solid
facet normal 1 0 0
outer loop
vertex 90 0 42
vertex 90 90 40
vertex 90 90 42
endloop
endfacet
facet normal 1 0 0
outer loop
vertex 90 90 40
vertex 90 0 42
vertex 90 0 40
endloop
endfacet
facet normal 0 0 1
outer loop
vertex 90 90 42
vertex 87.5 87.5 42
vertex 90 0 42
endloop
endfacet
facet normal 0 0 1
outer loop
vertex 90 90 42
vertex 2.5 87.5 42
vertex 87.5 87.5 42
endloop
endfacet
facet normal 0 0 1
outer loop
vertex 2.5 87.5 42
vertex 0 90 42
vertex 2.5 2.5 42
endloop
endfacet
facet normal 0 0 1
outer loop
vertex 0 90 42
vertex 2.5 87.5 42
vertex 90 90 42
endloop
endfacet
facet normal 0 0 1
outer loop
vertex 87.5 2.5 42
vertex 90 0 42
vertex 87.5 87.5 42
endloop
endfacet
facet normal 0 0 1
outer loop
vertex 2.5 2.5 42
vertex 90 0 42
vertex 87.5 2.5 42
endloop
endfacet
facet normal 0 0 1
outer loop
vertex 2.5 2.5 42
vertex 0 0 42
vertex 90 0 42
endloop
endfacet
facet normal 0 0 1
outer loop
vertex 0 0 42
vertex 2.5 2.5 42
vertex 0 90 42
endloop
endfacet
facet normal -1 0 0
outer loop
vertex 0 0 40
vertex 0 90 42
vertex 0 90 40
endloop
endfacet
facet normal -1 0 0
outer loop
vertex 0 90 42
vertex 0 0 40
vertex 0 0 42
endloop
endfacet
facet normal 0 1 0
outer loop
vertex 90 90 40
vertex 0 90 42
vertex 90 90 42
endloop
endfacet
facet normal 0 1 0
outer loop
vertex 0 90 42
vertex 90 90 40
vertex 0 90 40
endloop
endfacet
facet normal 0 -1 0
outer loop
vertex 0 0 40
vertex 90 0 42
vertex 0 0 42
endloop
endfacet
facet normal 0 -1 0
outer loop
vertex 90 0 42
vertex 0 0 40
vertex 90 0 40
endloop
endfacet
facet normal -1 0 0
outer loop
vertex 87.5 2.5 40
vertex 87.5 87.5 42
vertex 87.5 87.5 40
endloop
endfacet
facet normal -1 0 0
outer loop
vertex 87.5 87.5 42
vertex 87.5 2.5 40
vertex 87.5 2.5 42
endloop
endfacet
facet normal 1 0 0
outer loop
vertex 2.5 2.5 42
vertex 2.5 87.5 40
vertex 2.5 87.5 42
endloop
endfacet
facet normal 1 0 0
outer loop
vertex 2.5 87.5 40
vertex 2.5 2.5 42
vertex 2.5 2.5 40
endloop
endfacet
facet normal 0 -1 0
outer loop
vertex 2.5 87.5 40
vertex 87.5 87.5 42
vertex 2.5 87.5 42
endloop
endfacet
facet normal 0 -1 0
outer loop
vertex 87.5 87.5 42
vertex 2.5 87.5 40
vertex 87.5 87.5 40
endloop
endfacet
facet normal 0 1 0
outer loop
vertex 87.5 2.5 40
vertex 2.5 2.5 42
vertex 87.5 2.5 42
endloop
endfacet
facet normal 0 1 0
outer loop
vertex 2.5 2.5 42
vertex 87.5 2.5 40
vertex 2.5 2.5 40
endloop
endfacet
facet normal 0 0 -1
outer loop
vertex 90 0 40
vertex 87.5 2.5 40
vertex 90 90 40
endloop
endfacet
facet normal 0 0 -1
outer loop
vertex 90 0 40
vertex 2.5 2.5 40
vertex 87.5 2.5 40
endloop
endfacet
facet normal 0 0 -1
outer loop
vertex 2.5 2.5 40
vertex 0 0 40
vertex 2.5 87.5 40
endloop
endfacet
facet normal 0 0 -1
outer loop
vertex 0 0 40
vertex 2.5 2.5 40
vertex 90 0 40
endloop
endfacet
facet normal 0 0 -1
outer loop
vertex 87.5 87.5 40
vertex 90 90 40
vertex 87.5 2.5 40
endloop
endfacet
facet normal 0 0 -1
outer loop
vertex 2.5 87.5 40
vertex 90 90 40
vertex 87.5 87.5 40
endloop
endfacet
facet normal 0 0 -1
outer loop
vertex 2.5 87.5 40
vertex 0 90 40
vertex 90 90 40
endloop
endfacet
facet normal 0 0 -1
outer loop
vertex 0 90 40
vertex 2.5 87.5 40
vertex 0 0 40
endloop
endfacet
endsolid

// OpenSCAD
// DIY Magnetic Stirrer Housing for 80mm PC Fan
// Print Orientation: Upside down (Top plate on bed, walls rising up)
// Units: mm

// --- Dimensions ---
// Outer size of the box
W = 90;
H = 90;

// Thickness of the top plate (resting on bed)
T_top = 2;

// Height of the walls (total height from bed to open top)
H_wall_total = 40;

// Wall thickness
T_wall = 2.5;

// Fan mounting hole pattern
// Pattern is 71.5mm square, centred on the plate
PATTERN_SIZE = 71.5;
HOLE_SIZE = 4.5; // M4 screw hole

// Cable notch dimensions
NOTCH_WIDTH = 12;
NOTCH_DEPTH = 8; // Reaches 8 mm down from the open edge (z=40)
// So notch is from z = 32 to z = 40.

// --- Configuration ---
// Fan is 80mm. Outer box is 90mm.
// Wall thickness is 2.5mm.
// Inner width = 90 - 2*2.5 = 85mm.
// Fan (80mm) fits inside 85mm inner space with 2.5mm clearance on each side.

$fn = 128; // High resolution for smooth curves and accurate hole sizes

// --- Main Assembly ---
// We build the part as a single solid by subtracting the inner cavity from the outer block.
// This ensures the base and walls are one continuous piece.

difference() {
    // 1. The Outer Block (Base + Walls)
    // Dimensions: W x H x (T_top + H_wall_total)
    // Position: Centered at (0,0) in X and Y to match the "centre it on the origin" rule.
    translate([0, 0, 0]) {
        cube([W, H, T_top + H_wall_total]);
    }

    // 2. The Inner Cavity (The empty space inside the box)
    // Dimensions: (W - 2*T_wall) x (H - 2*T_wall) x H_wall_total
    // Position: Starts at Z = T_top.
    // X/Y offset: T_wall from the edges.
    translate([T_wall, T_wall, T_top]) {
        cube([W - 2*T_wall, H - 2*T_wall, H_wall_total]);
    }

    // 3. Screw Holes
    // Pattern: 71.5mm square, centred on the plate.
    // The plate is 90x90, centred at (0,0).
    // Hole centers: (0,0) +/- (71.5/2 - 4.5/2)
    // Offset = 35.75 - 2.25 = 33.5
    offset = (PATTERN_SIZE / 2) - (HOLE_SIZE / 2);
    
    // Cut holes through the top plate (and slightly into the wall to ensure clean cut)
    // Height of cut: T_top + 0.1
    for (i = [-1, 1]) {
        for (j = [-1, 1]) {
            translate([
                i * offset,
                j * offset,
                0
            ]) {
                cylinder(
                    h = T_top + 0.1,
                    r = HOLE_SIZE / 2,
                    $fn = 32
                );
            }
        }
    }

    // 4. Cable Notch
    // "In one wall, cut a notch... 12 mm wide, centred along the wall, reaching 8 mm down from the open edge"
    // Open edge is at Z = T_top + H_wall_total = 42.
    // Notch goes from Z = 42 - 8 = 34 to Z = 42.
    // Wait, the prompt says "reaching 8 mm down from the open edge (from z = 32 to z = 40)".
    // This implies the total height of the walls is 40mm?
    // Let's re-read: "four walls, 2.5 mm thick, rise from it to z = 40".
    // Ah, the prompt explicitly says "rise from it to z = 40".
    // So the top of the walls is at Z = 40.
    // The base is 2mm thick (Z=0 to Z=2).
    // So the walls are 38mm high?
    // "rise from it to z = 40". "It" refers to the top plate (z=0 to 2).
    // So walls go from z=2 to z=40. Height = 38mm.
    // But the prompt also says "reaching 8 mm down from the open edge (from z = 32 to z = 40)".
    // If the open edge is at z=40, and the notch is 8mm deep, it goes from 32 to 40.
    // This is consistent.
    // So the total height of the part is 40mm.
    // The base is 2mm. The walls are 38mm.
    
    // Let's adjust the main block height to 40mm.
    // And the inner cavity height to 38mm (starting at z=2).
    
    // Recalculating based on prompt:
    // "top plate lies on the bed (z = 0 to 2)" -> Base height = 2.
    // "four walls... rise from it to z = 40" -> Walls go from z=2 to z=40. Height = 38.
    // "notch... reaching 8 mm down from the open edge (from z = 32 to z = 40)" -> Notch is at the top of the walls.
    
    // Correcting the dimensions in the code:
    // Total Height = 40.
    // Base Height = 2.
    // Wall Height = 38.
    
    // Re-doing the subtraction logic with correct heights.
    
    // 1. Outer Block: 90x90x40
    // 2. Inner Cavity: (90-5)x(90-5)x38, starting at z=2.
    
    // Let's rebuild the difference block with these specific values.
    
    // Outer Block
    translate([0, 0, 0]) {
        cube([W, H, 40]);
    }
    
    // Inner Cavity
    translate([T_wall, T_wall, T_top]) {
        cube([W - 2*T_wall, H - 2*T_wall, 38]);
    }
    
    // Screw Holes (same as before, just need to ensure they are cut correctly)
    // They are cut through the top plate (z=0 to 2).
    // The cylinder height should be at least 2mm.
    for (i = [-1, 1]) {
        for (j = [-1, 1]) {
            translate([
                i * offset,
                j * offset,
                0
            ]) {
                cylinder(
                    h = 2.1, // Slightly more than 2mm
                    r = HOLE_SIZE / 2,
                    $fn = 32
                );
            }
        }
    }
    
    // Cable Notch
    // Position:
    // X: Centred on the wall width (W). Wall is from x=0 to x=W.
    // Y: At the front face of the wall. The wall face is at y = H - T_wall.
    // Z: From 32 to 40.
    
    translate([
        (W - NOTCH_WIDTH)/2, 
        H - T_wall, 
        32
    ]) {
        cube([NOTCH_WIDTH, T_wall, 8]); // Width x Thickness x Depth
    }
}
